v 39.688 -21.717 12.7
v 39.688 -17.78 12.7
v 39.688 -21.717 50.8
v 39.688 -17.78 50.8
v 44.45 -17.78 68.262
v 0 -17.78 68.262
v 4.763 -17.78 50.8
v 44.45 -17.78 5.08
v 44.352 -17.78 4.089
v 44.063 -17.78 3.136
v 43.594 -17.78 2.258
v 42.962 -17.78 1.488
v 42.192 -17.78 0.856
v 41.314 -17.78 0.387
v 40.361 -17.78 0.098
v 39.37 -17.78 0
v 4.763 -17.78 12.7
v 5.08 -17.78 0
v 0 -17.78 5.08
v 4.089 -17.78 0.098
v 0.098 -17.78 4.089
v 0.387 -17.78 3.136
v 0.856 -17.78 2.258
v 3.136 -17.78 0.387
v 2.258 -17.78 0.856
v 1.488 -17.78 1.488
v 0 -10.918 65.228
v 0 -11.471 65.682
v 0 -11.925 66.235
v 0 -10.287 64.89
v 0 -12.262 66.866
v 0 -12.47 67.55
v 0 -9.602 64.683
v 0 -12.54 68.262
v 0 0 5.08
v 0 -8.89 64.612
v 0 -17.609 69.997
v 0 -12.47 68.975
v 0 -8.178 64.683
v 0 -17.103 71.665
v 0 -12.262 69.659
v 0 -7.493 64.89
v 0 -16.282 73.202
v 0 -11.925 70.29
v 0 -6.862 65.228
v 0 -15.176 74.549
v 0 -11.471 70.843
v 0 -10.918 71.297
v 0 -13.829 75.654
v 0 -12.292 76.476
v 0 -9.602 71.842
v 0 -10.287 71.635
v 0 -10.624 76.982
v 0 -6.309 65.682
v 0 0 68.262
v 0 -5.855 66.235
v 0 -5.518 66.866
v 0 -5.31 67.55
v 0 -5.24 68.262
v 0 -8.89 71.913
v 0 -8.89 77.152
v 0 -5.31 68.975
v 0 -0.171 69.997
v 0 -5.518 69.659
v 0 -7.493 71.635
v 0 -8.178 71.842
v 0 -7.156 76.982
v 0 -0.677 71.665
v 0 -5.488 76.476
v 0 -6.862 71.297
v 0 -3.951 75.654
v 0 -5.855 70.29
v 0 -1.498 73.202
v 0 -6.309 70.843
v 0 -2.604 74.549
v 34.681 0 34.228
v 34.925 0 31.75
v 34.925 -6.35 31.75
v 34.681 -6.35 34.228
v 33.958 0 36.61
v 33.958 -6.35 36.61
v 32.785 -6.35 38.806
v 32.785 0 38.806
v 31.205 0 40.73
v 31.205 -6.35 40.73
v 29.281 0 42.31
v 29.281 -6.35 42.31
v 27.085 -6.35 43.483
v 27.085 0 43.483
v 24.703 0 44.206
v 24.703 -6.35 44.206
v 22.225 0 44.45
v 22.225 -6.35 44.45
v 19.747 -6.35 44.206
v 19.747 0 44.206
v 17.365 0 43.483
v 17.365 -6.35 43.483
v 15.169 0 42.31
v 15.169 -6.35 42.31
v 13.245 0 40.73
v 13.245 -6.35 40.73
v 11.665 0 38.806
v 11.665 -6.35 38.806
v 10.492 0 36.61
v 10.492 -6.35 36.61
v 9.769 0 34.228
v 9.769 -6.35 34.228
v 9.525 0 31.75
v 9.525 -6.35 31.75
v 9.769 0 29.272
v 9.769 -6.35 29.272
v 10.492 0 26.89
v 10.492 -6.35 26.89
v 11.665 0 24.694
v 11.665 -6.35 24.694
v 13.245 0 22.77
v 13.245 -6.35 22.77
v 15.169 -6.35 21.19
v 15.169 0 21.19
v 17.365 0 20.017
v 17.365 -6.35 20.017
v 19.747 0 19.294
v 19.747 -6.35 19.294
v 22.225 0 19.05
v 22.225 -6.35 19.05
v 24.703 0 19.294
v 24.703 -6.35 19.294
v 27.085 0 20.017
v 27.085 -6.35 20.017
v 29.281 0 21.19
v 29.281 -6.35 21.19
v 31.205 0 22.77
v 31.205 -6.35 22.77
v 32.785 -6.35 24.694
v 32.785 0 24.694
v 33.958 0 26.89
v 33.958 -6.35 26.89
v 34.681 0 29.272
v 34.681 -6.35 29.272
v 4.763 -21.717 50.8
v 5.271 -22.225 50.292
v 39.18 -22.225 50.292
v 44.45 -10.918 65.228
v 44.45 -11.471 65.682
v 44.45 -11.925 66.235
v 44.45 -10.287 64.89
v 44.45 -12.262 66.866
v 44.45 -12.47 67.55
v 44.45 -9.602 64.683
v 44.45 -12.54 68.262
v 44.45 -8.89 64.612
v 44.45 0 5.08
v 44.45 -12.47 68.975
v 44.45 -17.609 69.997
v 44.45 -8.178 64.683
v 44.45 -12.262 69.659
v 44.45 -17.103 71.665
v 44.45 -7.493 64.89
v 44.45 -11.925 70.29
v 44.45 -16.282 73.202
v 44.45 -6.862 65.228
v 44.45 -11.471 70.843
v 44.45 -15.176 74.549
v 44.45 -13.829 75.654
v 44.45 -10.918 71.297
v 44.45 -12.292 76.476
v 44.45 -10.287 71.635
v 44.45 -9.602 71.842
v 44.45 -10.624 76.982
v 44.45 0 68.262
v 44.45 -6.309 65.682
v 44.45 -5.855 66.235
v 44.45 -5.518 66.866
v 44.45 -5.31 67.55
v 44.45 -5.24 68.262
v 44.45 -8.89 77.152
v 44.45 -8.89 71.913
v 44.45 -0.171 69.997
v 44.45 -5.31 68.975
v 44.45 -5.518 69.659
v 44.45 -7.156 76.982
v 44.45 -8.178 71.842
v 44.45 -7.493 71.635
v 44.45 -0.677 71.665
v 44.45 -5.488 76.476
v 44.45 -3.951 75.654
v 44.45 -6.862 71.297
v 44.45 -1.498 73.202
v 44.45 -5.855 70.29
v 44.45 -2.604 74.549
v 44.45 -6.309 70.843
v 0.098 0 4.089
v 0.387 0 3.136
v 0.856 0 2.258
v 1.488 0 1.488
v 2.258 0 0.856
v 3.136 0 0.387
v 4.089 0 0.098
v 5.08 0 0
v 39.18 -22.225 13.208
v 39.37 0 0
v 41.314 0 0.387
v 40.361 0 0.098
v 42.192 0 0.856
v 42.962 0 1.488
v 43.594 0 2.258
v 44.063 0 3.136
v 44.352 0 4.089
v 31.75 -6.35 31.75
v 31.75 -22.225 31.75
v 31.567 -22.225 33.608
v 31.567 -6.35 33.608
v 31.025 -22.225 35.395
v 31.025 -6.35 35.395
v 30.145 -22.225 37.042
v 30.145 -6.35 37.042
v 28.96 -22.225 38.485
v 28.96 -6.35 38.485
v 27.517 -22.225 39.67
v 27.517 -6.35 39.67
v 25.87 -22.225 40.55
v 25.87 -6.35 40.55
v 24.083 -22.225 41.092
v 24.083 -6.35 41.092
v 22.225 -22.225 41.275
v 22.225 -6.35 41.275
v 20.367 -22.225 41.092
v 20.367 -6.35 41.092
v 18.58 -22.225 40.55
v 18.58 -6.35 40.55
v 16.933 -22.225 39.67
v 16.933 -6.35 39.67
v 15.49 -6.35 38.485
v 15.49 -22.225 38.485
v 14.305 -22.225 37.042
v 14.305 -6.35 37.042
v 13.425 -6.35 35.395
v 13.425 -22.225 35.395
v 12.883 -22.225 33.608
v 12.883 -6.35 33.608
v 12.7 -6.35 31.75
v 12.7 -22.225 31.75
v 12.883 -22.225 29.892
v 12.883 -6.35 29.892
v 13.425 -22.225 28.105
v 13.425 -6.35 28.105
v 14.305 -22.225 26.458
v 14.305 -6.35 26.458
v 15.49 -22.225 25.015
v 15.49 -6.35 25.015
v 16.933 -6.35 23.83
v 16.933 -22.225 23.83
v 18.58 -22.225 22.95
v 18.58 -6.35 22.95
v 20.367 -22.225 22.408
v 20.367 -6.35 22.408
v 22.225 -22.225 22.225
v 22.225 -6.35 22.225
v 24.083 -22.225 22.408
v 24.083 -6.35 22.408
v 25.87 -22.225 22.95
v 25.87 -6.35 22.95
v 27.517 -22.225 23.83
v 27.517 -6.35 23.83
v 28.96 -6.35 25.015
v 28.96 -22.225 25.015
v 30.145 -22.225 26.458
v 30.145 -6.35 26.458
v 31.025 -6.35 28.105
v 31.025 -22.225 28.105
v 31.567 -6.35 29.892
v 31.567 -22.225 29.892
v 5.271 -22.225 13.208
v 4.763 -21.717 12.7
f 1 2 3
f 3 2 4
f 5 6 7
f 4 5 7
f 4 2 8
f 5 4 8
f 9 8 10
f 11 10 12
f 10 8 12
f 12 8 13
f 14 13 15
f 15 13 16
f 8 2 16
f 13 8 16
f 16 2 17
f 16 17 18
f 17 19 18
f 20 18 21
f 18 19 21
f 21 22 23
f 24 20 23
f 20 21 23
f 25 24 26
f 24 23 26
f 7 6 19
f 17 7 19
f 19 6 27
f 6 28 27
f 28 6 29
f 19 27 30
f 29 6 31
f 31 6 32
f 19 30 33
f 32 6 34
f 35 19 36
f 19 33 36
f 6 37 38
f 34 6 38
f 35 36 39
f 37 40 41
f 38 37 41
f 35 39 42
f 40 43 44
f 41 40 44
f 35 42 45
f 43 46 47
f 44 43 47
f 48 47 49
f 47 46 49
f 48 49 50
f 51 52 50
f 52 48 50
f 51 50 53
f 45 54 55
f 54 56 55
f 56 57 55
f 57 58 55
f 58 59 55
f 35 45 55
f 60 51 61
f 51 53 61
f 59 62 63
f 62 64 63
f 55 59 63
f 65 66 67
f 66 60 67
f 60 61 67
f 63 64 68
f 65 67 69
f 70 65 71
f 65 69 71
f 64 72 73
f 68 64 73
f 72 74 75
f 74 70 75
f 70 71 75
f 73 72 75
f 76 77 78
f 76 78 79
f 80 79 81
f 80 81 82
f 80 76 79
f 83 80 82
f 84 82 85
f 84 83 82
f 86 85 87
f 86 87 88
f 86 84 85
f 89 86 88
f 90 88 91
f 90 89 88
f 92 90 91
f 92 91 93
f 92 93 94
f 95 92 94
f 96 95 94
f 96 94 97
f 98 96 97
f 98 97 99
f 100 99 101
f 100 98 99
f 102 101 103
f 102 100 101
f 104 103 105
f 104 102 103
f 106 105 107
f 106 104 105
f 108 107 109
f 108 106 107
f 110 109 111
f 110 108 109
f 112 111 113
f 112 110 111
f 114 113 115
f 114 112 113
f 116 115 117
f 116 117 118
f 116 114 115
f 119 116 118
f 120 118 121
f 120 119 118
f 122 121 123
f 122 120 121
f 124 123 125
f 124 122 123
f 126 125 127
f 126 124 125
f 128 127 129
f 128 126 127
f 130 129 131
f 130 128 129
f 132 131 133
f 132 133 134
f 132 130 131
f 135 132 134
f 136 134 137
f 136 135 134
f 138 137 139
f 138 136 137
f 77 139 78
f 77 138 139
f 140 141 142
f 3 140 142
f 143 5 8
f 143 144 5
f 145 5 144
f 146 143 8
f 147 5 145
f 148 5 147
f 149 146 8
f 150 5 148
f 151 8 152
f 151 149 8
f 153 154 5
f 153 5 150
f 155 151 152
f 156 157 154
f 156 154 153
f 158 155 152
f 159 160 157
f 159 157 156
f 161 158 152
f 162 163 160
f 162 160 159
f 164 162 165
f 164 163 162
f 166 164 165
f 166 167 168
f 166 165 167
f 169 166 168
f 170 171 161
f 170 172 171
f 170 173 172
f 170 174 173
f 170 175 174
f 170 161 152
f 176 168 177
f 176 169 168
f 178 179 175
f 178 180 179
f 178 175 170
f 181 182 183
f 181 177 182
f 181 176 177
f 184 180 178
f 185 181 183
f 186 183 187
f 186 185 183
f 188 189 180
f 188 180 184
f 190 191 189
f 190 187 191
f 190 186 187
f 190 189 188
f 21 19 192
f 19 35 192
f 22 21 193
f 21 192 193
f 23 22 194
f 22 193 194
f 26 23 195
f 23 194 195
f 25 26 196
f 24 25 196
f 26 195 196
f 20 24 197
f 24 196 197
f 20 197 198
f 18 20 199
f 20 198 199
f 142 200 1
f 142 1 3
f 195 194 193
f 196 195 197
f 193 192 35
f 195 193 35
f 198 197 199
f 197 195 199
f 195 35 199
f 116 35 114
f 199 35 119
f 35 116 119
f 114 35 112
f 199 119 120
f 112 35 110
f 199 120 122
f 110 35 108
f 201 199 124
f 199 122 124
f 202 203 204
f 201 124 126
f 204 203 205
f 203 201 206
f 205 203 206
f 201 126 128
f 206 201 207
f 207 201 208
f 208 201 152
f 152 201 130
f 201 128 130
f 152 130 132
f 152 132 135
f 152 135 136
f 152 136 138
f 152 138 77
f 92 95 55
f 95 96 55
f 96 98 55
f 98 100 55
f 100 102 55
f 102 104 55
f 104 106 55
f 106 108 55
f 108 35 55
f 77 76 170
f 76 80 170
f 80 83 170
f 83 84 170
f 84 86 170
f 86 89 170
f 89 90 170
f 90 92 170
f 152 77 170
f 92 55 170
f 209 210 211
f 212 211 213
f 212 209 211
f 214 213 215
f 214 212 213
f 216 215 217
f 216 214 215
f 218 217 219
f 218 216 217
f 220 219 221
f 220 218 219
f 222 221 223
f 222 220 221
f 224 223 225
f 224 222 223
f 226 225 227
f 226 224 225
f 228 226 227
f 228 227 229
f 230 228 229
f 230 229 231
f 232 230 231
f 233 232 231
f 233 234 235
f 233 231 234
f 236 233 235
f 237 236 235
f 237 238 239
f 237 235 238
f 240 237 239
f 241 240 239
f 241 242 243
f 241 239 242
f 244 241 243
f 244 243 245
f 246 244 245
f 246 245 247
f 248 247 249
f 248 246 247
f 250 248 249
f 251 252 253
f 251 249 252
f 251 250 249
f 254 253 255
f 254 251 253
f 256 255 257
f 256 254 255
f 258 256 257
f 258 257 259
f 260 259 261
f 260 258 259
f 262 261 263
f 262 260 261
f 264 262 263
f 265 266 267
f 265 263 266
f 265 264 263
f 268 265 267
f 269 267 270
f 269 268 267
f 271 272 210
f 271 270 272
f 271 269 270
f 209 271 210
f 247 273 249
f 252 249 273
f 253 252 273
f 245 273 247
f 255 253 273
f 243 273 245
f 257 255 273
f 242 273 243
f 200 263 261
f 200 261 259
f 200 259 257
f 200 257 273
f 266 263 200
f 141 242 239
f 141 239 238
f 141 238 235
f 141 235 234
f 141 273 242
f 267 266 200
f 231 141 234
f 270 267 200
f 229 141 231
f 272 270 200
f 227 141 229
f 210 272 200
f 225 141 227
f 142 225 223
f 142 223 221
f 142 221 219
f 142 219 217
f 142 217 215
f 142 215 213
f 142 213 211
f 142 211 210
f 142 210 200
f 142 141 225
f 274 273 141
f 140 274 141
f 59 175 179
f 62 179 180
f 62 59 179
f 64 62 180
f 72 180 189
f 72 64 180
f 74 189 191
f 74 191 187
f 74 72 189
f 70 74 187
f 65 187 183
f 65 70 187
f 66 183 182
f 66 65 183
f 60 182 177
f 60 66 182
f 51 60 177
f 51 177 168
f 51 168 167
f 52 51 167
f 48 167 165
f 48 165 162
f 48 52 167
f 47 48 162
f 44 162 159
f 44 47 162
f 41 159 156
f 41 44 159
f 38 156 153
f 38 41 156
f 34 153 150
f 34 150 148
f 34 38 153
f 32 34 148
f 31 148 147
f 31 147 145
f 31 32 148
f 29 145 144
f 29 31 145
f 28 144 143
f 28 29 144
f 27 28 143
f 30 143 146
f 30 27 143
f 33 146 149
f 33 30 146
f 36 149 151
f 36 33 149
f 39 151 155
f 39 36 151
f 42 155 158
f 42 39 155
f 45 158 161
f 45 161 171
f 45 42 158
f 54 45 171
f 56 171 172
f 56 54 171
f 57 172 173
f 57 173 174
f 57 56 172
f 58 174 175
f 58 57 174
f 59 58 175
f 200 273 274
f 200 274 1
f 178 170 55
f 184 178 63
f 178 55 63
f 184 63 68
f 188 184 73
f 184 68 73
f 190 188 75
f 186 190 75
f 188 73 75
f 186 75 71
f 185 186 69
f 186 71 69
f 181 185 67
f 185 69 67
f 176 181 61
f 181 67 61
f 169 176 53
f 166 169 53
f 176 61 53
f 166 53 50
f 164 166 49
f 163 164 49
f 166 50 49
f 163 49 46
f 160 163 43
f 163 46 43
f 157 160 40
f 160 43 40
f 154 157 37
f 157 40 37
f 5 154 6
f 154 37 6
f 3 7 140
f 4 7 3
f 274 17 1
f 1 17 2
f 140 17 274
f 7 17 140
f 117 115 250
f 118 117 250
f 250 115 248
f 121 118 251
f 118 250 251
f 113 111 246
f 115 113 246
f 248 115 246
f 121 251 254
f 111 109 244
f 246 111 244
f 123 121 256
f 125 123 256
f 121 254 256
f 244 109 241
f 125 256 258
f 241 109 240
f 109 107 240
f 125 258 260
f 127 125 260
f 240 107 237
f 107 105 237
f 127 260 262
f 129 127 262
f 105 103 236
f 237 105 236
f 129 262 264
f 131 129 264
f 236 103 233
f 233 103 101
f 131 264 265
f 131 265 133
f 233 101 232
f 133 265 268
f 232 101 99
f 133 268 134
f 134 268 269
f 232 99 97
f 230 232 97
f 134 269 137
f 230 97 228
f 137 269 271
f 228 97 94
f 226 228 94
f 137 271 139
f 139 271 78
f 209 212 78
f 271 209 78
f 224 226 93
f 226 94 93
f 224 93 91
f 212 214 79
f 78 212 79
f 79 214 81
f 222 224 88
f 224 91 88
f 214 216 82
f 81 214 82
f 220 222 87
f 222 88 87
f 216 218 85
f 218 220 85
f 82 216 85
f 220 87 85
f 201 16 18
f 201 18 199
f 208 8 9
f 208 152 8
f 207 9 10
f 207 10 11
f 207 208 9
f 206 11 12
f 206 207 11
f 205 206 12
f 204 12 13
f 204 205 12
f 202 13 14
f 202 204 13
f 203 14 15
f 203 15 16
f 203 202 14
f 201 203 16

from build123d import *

# Parameters (mm, degrees)
F0_R     = 3.65
F1_DEPTH = 44.45
F3_W     = 34.925
F3_H     = 38.1
F4_DEPTH = 22.225
F5_SIZE  = 0.508
F2_R     = 12.7
F2_R_2   = 9.525
F6_DEPTH = 6.35
F7_DEPTH = 25.4
F8_R     = 5.08


with BuildPart() as f1:
    # F0 (on Right) → F1 (new body)
    with BuildSketch(Plane.YZ):
        with BuildLine():
            Line((-17.78, 0), (0, 0))
            Line((0, 0), (0, 68.2625))
            ThreePointArc((0, 68.2625), (-8.89, 77.1525), (-17.78, 68.2625))
            Line((-17.78, 68.2625), (-17.78, 0))
        make_face()
        with Locations((-8.89, 68.2625)):
            Circle(F0_R, mode=Mode.SUBTRACT)
    extrude(amount=F1_DEPTH)

    # F3 (on Front) → F4 (join)
    with BuildSketch(Plane.XZ):
        with Locations((22.225, 31.75)):
            Rectangle(F3_W, F3_H)
    extrude(amount=F4_DEPTH)

    # F5
    f5_edges = [f1.edges().sort_by_distance(p)[0] for p in [
        (4.7625, -22.225, 31.75),
        (22.225, -22.225, 50.8),
        (22.225, -22.225, 12.7),
        (39.6875, -22.225, 31.75),
    ]]
    chamfer(f5_edges, length=F5_SIZE)

    # F2 (on Front) → F6 (cut)
    with BuildSketch(Plane.XZ):
        with Locations((22.225, 31.75)):
            Circle(F2_R)
        with Locations((22.225, 31.75)):
            Circle(F2_R_2, mode=Mode.SUBTRACT)
    extrude(amount=F6_DEPTH, mode=Mode.SUBTRACT)

    # F2 (on Front) → F7 (cut)
    with BuildSketch(Plane.XZ):
        with Locations((22.225, 31.75)):
            Circle(F2_R_2)
    extrude(amount=F7_DEPTH, mode=Mode.SUBTRACT)

    # F8
    f8_edges = [f1.edges().sort_by_distance(p)[0] for p in [
        (0, -8.89, 0),
        (44.45, -8.89, 0),
    ]]
    fillet(f8_edges, radius=F8_R)


solid = f1.part
